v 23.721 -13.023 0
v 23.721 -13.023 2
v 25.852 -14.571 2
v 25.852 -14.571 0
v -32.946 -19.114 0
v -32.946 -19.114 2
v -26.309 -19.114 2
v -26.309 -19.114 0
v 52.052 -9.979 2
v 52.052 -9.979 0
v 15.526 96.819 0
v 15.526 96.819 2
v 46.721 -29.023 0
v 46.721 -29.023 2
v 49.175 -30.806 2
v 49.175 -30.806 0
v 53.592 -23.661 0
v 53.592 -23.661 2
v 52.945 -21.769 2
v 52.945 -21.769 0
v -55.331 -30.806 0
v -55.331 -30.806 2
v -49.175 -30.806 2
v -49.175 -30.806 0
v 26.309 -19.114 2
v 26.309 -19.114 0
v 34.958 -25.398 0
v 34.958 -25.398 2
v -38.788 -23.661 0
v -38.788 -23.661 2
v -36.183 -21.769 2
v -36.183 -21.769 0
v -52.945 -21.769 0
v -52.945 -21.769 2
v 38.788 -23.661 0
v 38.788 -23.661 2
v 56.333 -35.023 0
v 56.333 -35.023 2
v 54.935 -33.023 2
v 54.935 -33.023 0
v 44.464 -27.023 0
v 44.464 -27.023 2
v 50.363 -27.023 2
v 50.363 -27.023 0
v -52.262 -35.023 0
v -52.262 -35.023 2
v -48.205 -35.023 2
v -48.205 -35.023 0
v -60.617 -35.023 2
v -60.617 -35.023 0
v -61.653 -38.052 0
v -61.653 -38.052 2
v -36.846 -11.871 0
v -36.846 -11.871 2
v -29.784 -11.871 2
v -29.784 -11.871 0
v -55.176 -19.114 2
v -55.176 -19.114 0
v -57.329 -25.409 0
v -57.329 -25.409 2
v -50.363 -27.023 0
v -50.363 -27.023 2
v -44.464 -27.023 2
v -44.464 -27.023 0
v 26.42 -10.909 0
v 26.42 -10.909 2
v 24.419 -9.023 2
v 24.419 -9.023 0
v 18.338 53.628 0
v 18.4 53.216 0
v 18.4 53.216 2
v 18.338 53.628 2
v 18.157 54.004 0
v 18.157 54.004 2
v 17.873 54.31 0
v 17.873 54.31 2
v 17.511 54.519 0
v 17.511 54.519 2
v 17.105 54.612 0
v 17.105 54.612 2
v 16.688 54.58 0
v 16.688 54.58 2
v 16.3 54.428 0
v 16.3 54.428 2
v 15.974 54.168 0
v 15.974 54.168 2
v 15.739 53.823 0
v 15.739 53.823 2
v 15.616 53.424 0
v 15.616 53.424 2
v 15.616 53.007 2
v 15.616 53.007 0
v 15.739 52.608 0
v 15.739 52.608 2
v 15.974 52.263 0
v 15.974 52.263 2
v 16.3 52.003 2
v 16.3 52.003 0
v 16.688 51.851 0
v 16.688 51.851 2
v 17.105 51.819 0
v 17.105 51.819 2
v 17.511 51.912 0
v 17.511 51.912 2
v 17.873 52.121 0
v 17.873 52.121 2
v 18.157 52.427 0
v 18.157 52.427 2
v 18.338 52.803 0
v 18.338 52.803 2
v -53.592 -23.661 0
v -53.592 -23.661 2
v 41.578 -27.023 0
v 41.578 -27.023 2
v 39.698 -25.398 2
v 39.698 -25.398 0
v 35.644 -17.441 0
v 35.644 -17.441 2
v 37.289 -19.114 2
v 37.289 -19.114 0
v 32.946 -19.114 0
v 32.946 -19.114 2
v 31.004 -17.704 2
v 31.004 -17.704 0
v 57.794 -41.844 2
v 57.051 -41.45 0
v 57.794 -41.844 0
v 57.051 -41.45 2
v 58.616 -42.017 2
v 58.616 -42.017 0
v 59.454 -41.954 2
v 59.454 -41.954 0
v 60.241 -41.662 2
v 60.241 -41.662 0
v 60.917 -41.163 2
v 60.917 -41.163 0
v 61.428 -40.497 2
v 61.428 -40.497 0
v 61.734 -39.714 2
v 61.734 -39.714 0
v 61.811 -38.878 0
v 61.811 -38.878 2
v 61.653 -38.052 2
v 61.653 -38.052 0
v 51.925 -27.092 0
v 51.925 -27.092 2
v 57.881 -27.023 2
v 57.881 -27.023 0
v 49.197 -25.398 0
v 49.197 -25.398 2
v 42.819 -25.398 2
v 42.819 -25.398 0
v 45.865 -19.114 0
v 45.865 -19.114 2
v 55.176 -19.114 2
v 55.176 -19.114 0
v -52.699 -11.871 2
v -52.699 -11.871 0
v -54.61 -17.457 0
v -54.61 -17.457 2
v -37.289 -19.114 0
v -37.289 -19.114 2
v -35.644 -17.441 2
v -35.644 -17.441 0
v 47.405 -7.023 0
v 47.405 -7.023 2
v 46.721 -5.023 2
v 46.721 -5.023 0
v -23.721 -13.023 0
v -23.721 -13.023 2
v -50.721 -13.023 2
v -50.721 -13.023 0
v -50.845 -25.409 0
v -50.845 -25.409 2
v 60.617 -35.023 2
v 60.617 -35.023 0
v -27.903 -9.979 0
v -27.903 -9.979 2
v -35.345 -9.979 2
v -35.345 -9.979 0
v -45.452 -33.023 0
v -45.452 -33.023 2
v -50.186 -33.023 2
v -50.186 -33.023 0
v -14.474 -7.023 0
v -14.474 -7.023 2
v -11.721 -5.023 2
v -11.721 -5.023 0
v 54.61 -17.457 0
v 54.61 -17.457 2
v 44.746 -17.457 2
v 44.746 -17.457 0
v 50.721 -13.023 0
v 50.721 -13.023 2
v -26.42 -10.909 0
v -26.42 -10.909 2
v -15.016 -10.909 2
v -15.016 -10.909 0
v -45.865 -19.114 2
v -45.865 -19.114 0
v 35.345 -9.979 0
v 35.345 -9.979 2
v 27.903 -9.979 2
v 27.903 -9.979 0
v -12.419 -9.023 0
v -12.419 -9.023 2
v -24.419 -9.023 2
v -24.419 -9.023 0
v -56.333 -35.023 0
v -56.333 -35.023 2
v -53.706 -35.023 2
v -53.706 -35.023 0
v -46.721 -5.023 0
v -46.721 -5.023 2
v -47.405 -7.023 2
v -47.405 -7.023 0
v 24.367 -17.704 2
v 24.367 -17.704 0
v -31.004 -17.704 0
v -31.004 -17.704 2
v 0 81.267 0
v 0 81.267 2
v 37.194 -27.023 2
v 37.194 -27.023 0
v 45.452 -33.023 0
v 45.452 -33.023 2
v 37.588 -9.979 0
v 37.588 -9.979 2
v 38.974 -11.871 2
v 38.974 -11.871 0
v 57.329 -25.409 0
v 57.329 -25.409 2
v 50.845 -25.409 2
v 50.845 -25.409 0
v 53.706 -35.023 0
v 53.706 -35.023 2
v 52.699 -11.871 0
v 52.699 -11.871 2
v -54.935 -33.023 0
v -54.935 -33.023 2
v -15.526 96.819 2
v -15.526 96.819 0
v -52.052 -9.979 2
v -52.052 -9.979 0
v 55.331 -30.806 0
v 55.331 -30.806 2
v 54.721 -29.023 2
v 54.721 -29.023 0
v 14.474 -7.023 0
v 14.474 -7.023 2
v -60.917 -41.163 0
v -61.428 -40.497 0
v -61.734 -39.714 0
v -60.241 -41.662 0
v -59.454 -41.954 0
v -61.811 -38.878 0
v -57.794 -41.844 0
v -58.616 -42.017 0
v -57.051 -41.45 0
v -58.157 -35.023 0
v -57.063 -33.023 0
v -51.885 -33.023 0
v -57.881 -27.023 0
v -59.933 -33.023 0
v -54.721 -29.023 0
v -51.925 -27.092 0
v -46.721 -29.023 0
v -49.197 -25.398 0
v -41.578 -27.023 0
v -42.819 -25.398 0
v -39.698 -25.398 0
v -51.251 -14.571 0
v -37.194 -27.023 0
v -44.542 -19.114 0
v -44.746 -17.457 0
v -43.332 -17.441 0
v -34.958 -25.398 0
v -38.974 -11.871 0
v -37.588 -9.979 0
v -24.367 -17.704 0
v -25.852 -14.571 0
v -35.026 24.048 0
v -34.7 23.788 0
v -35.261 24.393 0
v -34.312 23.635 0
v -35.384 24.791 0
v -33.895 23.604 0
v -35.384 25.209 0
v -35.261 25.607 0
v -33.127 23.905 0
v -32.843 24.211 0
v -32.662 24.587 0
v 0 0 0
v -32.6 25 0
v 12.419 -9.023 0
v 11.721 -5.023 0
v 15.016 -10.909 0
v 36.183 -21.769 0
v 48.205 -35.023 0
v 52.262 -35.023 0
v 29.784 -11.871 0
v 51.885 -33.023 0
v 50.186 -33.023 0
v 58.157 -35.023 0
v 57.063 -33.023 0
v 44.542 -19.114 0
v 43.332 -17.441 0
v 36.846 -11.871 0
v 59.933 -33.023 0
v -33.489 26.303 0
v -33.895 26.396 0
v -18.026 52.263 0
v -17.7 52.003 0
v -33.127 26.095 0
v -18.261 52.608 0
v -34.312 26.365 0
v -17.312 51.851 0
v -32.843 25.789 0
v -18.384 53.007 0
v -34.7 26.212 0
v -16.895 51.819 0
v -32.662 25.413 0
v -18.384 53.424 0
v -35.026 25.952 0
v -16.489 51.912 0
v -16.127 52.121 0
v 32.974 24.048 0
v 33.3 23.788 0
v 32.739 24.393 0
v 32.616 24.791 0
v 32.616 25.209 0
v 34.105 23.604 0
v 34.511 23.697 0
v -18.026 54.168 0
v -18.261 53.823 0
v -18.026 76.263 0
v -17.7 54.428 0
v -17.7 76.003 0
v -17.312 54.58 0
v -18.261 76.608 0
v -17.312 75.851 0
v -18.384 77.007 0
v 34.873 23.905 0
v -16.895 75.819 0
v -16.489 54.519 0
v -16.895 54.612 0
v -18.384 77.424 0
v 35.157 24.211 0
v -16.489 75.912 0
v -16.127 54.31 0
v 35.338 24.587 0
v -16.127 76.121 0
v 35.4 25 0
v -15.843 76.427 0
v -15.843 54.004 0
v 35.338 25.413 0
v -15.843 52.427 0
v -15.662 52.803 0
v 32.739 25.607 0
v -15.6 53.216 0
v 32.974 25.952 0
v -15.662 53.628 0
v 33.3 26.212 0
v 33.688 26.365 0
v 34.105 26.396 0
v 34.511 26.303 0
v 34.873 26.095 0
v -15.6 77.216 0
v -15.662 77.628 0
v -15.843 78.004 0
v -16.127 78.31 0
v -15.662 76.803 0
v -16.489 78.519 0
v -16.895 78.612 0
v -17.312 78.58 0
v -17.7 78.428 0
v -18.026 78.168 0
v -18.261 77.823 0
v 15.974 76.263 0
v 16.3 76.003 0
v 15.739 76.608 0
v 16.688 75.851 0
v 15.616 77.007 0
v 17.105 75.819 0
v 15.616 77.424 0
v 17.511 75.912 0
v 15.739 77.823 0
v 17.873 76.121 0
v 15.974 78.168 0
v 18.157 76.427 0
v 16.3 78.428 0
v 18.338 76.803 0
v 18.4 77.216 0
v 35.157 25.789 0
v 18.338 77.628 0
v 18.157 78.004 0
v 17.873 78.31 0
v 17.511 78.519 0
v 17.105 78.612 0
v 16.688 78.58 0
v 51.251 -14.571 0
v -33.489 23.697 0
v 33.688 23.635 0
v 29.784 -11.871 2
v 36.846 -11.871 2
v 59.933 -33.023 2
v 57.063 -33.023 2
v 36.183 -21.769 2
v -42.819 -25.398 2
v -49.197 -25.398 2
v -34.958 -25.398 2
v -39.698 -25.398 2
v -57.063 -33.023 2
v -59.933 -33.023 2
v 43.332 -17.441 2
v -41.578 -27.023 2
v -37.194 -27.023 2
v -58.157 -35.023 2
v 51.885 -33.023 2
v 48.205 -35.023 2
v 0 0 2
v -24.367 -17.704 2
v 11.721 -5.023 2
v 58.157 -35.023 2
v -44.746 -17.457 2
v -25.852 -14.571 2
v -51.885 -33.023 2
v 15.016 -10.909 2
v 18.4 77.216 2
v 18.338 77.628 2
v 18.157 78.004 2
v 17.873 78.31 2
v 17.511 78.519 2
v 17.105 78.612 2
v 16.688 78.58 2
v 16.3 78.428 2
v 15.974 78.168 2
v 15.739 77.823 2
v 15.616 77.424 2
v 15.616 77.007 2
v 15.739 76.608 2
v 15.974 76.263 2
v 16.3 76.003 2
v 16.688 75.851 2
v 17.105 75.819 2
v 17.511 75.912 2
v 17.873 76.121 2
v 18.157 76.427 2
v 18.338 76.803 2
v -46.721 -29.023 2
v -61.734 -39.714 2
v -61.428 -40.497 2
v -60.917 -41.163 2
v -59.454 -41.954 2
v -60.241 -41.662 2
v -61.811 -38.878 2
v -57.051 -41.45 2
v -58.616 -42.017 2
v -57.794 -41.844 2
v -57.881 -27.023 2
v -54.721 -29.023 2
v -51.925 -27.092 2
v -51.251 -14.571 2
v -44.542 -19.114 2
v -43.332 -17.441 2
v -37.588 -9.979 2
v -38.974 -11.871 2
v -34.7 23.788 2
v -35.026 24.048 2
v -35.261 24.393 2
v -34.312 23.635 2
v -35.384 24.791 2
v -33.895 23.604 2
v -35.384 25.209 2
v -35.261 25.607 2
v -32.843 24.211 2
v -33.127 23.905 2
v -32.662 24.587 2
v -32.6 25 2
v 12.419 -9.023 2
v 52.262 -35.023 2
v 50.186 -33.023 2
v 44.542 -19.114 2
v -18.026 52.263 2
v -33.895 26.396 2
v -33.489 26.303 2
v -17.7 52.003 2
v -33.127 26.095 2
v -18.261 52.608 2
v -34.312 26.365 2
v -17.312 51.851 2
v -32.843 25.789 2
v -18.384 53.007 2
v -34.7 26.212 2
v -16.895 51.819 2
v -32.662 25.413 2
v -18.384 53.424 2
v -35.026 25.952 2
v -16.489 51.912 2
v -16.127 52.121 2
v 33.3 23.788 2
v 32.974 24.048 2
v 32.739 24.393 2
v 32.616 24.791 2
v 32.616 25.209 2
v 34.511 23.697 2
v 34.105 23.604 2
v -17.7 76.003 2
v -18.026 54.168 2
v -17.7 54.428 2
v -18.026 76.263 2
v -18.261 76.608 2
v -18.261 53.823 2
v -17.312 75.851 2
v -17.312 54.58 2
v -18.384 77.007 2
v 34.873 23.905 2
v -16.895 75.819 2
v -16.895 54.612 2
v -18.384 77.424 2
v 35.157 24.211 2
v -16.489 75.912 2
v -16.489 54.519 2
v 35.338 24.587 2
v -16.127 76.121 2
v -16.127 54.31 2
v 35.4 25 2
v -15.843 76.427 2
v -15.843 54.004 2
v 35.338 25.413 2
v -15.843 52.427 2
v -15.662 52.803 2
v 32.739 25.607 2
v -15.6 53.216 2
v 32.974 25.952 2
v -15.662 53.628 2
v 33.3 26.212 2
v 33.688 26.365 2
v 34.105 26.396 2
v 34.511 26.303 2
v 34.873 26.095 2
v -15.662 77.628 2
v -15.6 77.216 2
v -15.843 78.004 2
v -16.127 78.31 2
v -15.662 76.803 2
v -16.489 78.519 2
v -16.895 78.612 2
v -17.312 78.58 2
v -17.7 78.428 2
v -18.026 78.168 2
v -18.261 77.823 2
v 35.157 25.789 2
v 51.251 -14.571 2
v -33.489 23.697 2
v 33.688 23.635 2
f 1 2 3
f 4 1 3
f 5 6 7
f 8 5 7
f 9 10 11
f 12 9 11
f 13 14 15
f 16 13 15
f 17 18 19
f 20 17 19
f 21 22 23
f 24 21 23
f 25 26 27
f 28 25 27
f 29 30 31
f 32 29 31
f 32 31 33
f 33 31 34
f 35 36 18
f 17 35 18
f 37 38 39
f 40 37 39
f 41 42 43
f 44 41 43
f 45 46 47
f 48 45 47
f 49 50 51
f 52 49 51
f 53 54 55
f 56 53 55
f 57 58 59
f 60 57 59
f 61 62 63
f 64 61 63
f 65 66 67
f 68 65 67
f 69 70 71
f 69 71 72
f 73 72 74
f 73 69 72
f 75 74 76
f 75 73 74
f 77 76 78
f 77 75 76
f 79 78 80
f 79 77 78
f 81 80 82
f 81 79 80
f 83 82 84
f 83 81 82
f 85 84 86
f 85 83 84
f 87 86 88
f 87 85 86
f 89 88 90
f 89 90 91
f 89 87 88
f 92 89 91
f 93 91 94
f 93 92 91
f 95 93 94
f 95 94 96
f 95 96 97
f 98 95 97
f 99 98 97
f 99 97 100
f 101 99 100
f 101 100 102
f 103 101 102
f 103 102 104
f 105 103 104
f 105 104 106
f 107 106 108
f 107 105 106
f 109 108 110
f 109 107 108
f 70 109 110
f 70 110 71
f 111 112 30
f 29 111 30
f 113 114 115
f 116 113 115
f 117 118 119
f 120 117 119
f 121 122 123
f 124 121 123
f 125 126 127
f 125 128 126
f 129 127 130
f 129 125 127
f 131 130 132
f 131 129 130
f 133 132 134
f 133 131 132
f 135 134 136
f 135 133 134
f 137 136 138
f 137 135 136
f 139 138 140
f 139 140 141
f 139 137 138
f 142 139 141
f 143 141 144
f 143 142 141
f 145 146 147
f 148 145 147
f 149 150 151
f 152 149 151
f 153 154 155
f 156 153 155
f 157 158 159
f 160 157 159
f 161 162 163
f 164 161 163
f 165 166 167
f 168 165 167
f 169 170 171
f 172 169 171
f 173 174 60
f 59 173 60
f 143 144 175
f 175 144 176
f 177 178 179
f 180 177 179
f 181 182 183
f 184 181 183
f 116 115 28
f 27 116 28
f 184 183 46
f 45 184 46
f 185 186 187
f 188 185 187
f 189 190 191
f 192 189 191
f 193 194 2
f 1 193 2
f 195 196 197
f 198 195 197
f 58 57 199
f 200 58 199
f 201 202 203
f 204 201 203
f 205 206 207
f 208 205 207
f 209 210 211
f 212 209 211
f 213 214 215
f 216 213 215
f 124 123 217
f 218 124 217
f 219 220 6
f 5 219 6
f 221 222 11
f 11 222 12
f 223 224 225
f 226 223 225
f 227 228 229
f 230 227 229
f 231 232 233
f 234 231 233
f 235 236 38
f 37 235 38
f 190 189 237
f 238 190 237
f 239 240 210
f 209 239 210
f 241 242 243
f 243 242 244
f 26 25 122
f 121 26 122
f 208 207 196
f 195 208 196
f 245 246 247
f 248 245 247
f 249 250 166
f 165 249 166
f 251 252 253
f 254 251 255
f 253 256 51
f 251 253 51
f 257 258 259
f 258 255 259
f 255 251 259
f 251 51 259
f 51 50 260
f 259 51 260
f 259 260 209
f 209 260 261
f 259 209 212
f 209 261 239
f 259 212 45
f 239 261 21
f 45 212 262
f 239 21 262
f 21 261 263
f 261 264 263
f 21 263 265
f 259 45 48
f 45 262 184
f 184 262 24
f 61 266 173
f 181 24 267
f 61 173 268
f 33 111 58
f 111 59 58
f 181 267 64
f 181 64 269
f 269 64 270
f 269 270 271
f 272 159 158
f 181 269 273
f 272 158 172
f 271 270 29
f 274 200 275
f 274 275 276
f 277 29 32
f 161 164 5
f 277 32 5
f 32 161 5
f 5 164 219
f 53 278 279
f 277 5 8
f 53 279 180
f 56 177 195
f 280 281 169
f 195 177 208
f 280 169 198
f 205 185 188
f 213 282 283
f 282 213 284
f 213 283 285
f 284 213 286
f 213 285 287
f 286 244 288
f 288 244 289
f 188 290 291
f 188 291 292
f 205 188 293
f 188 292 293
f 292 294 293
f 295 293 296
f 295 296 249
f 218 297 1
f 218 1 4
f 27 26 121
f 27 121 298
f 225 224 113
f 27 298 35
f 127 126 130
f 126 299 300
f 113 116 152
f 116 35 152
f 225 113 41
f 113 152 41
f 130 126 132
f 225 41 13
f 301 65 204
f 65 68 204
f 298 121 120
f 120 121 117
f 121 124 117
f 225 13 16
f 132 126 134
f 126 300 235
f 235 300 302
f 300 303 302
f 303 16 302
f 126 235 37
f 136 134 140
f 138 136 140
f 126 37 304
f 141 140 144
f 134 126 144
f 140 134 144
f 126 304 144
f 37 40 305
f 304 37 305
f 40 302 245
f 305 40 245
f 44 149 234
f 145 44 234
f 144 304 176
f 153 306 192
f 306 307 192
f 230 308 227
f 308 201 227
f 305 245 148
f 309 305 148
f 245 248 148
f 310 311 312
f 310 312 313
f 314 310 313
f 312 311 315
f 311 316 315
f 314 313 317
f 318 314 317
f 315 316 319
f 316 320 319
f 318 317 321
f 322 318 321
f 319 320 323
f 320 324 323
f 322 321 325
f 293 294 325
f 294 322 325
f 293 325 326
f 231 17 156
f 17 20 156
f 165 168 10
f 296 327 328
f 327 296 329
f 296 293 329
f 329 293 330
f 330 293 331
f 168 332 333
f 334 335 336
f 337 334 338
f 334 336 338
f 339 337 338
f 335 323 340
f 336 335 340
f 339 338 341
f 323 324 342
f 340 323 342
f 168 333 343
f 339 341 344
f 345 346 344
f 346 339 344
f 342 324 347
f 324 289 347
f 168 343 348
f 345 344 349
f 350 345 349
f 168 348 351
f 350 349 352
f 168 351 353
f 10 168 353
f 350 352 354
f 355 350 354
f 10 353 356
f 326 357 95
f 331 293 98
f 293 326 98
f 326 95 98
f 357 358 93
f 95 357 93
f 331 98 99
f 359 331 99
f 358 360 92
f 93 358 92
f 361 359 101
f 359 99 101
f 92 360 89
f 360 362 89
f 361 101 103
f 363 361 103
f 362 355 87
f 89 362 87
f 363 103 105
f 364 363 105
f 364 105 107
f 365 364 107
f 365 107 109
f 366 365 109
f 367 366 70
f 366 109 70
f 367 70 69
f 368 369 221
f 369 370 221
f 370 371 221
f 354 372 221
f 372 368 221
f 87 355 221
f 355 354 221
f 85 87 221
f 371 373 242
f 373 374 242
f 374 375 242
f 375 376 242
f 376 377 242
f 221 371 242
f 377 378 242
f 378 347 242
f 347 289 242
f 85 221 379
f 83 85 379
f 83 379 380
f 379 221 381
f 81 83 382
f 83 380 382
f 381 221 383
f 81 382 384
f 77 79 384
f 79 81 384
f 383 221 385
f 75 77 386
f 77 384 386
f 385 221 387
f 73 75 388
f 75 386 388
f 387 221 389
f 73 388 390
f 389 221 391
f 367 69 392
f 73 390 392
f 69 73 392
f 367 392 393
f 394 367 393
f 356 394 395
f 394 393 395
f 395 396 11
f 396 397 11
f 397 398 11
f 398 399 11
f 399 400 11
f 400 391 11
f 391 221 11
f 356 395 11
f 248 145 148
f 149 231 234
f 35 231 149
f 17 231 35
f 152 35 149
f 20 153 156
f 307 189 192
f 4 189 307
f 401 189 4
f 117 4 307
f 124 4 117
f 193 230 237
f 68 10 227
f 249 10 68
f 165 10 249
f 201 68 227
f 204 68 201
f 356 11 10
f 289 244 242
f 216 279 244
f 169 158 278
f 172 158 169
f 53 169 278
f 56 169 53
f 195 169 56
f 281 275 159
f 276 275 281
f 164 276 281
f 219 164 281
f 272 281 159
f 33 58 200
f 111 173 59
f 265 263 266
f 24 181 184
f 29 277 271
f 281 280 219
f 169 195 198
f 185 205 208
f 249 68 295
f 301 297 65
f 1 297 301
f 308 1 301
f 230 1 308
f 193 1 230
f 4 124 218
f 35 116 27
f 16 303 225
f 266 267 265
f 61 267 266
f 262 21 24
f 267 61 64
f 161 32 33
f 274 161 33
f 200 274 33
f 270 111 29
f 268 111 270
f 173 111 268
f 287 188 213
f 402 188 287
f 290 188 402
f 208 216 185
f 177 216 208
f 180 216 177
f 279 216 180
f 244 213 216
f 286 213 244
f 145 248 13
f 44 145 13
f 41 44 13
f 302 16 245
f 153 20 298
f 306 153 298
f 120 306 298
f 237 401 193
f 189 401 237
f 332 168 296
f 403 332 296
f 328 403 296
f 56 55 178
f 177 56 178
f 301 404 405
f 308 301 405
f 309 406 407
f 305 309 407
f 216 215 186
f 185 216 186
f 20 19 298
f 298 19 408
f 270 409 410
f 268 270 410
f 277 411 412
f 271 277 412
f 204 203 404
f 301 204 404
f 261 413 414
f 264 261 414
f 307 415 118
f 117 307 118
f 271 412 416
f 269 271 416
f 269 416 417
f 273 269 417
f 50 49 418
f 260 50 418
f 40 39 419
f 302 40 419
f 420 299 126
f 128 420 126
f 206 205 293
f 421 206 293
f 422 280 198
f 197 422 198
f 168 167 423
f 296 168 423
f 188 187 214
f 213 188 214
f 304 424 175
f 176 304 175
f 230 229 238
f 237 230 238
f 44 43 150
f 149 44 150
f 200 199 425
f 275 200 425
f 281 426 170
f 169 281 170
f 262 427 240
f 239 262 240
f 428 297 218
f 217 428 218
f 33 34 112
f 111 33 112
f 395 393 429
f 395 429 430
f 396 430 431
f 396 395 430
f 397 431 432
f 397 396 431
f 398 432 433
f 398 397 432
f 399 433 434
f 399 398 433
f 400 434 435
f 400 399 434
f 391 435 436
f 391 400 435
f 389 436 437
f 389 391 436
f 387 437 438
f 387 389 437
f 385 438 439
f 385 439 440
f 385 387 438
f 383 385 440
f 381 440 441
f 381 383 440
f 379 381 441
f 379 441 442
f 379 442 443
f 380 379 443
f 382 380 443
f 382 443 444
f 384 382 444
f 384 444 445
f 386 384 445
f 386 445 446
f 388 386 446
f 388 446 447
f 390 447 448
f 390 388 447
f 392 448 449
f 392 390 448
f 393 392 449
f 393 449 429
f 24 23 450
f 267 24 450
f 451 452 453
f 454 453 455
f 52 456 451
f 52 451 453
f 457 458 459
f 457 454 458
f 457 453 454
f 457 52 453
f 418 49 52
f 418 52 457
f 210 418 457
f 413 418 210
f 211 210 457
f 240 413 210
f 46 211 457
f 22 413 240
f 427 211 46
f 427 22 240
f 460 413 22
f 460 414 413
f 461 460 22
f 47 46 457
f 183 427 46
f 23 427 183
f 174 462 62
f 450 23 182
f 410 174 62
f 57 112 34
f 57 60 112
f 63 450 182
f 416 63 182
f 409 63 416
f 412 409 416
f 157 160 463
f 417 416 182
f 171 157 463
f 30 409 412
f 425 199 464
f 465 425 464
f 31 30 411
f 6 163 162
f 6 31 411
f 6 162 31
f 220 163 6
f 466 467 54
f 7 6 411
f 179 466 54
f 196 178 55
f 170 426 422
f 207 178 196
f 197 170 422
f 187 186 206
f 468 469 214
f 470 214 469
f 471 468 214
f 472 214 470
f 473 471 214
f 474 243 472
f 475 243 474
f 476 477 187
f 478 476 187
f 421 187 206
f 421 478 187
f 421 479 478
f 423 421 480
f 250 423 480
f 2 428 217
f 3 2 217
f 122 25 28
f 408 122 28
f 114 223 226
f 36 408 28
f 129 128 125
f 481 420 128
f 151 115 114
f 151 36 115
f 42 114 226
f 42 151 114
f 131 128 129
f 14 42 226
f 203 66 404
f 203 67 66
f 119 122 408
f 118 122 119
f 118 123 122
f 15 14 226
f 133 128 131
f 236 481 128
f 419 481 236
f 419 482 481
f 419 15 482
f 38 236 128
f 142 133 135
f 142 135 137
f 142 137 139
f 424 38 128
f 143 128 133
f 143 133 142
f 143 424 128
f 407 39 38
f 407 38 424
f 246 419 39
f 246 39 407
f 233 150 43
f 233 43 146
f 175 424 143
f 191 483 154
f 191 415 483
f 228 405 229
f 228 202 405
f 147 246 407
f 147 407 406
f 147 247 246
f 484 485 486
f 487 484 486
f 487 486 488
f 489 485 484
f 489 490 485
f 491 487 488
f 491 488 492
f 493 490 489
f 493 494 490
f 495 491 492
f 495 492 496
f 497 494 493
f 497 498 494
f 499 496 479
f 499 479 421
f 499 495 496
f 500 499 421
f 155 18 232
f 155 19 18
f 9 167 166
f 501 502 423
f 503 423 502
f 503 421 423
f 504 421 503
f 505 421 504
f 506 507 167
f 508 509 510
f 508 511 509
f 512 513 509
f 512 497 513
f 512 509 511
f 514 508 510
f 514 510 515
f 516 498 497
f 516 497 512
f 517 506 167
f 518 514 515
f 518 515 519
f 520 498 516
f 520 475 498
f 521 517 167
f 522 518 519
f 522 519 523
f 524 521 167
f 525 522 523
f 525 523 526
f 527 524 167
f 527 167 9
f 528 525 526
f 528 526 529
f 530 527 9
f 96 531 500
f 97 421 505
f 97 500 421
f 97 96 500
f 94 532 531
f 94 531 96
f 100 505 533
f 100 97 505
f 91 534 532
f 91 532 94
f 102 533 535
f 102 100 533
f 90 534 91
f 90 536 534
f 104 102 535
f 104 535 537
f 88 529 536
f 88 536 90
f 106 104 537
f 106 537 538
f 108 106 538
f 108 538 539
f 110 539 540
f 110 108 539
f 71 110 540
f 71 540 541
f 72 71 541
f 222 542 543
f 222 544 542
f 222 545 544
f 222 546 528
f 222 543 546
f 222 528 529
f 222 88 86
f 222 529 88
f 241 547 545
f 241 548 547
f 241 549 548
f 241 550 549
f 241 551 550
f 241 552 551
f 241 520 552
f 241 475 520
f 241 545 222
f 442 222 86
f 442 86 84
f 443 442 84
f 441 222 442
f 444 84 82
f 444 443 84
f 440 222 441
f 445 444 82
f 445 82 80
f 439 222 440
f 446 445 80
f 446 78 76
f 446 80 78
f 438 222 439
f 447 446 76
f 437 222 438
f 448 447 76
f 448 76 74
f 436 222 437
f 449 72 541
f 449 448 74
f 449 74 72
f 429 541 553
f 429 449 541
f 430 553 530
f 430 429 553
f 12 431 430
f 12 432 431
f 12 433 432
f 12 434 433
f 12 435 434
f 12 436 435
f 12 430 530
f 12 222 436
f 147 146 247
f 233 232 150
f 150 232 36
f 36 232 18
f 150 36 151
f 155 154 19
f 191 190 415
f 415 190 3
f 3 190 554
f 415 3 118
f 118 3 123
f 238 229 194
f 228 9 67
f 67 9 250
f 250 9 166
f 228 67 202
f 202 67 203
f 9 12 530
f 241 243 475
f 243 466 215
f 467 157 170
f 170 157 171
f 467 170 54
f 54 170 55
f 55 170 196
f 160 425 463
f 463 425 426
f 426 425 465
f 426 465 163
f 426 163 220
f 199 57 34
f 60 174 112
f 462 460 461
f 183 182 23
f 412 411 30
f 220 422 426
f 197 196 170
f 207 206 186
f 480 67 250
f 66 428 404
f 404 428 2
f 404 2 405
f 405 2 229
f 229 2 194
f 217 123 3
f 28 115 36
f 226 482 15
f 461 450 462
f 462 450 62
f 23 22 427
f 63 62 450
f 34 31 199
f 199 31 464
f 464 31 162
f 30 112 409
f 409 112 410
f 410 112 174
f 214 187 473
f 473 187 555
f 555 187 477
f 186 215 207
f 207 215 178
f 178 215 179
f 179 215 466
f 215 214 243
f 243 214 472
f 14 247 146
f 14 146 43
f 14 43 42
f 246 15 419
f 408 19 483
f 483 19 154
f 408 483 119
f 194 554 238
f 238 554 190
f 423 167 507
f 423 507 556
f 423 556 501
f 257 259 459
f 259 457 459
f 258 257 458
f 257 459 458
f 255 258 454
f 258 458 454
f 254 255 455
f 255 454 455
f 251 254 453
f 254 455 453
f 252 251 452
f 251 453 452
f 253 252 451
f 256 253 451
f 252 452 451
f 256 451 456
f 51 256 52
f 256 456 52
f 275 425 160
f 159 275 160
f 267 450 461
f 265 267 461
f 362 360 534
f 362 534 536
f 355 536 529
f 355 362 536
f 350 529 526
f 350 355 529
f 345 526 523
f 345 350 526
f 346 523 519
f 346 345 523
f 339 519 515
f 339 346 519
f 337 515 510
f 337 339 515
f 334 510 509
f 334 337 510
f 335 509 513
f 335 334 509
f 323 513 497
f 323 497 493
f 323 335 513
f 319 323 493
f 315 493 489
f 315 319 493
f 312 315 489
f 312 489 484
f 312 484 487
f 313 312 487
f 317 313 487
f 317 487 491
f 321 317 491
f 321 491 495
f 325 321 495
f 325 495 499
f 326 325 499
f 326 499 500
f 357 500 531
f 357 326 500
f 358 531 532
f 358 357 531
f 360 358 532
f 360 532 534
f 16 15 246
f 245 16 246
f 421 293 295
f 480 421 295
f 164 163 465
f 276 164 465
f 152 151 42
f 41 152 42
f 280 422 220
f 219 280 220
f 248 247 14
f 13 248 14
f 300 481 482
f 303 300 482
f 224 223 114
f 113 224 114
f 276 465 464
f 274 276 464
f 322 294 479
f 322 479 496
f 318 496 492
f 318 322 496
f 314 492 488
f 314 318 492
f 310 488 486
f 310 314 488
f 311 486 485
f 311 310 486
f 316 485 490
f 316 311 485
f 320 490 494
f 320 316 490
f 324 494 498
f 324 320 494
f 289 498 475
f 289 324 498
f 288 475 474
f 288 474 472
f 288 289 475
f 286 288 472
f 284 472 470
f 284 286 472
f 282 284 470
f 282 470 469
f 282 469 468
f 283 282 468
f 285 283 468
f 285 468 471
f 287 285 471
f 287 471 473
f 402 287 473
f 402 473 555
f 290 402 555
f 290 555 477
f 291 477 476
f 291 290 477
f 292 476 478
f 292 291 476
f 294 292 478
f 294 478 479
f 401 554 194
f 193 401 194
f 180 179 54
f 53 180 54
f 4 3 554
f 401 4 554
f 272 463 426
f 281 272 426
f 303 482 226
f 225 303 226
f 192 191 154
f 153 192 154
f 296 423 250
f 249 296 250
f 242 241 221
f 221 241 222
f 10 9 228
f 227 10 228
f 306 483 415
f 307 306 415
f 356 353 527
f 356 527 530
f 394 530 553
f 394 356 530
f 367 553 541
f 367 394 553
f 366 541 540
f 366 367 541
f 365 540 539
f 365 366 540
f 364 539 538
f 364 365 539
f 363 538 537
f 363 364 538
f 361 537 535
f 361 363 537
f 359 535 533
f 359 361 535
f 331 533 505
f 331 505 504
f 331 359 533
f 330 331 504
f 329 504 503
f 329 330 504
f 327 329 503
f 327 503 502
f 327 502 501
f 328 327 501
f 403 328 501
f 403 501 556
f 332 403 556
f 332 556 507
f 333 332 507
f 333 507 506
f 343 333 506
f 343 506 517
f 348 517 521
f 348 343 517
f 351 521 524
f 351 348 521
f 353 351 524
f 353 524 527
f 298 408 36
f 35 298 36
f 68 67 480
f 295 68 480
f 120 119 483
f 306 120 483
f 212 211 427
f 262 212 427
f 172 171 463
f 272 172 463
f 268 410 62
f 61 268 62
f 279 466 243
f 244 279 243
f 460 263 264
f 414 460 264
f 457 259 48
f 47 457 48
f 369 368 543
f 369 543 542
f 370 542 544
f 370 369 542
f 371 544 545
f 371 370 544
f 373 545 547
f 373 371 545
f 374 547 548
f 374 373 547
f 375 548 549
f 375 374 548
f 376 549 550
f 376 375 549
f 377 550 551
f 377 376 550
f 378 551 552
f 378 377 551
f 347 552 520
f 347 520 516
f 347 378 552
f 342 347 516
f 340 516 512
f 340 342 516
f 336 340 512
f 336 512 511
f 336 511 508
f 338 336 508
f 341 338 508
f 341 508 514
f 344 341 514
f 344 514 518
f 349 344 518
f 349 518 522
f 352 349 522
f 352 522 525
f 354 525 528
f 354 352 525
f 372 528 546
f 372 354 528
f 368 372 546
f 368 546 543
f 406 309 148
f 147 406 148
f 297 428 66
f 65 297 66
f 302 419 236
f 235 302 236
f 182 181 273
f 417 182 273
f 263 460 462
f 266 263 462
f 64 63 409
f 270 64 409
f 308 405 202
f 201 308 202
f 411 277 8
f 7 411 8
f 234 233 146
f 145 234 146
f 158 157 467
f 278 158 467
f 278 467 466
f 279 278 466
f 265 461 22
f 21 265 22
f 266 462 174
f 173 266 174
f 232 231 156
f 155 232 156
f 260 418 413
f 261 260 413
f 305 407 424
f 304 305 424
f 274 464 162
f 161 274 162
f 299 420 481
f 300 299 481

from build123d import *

# Parameters (mm, degrees)
F0_R     = 1.4
F1_DEPTH = 2
F3_DEPTH = 2.001
F4_R     = 3
F5_R     = 3
F7_DEPTH = 2.001


with BuildPart() as f1:
    # F0 (on Top) → F1 (new body)
    with BuildSketch(Plane.XY):
        Polygon((64.72135955, -47.0228201834), (0, 142.2155100196), (-64.72135955, -47.0228201834), (0, 0), align=None)
        with Locations((-34, 25)):
            Circle(F0_R, mode=Mode.SUBTRACT)
        with Locations((34, 25)):
            Circle(F0_R, mode=Mode.SUBTRACT)
        with Locations((-17, 53.2155100196)):
            Circle(F0_R, mode=Mode.SUBTRACT)
        with Locations((-17, 77.2155100196)):
            Circle(F0_R, mode=Mode.SUBTRACT)
        with Locations((17, 53.2155100196)):
            Circle(F0_R, mode=Mode.SUBTRACT)
        with Locations((17, 77.2155100196)):
            Circle(F0_R, mode=Mode.SUBTRACT)
    extrude(amount=F1_DEPTH)

    # F2 (on face) → F3 (cut, through all)
    with BuildSketch(Plane.XY.offset(2)):
        Polygon((-11.72135955, -5.0228201834), (-46.72135955, -5.0228201834), (-47.4053791086, -7.0228201834), (-14.4741233909, -7.0228201834), align=None)
        Polygon((-12.4188465721, -9.0228201834), (-24.4188465721, -9.0228201834), (-26.4198078873, -10.9094650687), (-15.0155904826, -10.9094650687), align=None)
        Polygon((-23.72135955, -13.0228201834), (-50.72135955, -13.0228201834), (-51.2508899541, -14.5711104259), (-25.8523982474, -14.5711104259), align=None)
        Polygon((-54.6096456252, -17.4572506108), (-55.1764262564, -19.1144565314), (-45.8653729736, -19.1144565314), (-44.7456995673, -17.4572506108), align=None)
        Polygon((-36.183078901, -21.7685099146), (-52.9450522033, -21.7685099146), (-53.5922657988, -23.6608932166), (-38.7877210645, -23.6608932166), align=None)
        Polygon((-57.329058215, -25.4085220489), (-57.8811639638, -27.0228201834), (-51.9252746689, -27.0915274002), (-50.8447687747, -25.4085220489), align=None)
        Polygon((-42.8185183528, -25.398144593), (-49.1967415728, -25.398144593), (-50.3631159663, -27.0228201834), (-44.4640927017, -27.0228201834), align=None)
        Polygon((-34.9575470313, -25.398144593), (-39.6975811287, -25.398144593), (-41.5776334703, -27.0228201834), (-37.1937211406, -27.0228201834), align=None)
        Polygon((-46.72135955, -29.0228201834), (-54.72135955, -29.0228201834), (-55.3310927131, -30.8056147116), (-49.1751657065, -30.8056147116), align=None)
        Polygon((-59.9332226396, -33.0228201834), (-60.6172421983, -35.0228201834), (-58.1569412289, -35.0228201834), (-57.0628715088, -33.0228201834), align=None)
        Polygon((-52.0519517882, -9.9788275021), (-52.6991653837, -11.8712108041), (-38.9741415612, -11.8712108041), (-37.5880427095, -9.9788275021), align=None)
        Polygon((-32.9459308027, -19.1144565314), (-26.3087923894, -19.1144565314), (-24.3671516029, -17.7037719259), (-31.0042900162, -17.7037719259), align=None)
        Polygon((-35.6436006209, -17.440581688), (-43.3317036365, -17.440581688), (-44.5420111982, -19.1144565314), (-37.288930104, -19.1144565314), align=None)
        Polygon((-51.8852360547, -33.0228201834), (-54.9353141808, -33.0228201834), (-56.3333206621, -35.0228201834), (-53.706107908, -35.0228201834), align=None)
        Polygon((-45.4520126634, -33.0228201834), (-50.1858113088, -33.0228201834), (-52.2623182004, -35.0228201834), (-48.2047765043, -35.0228201834), align=None)
        Polygon((-27.9032053004, -9.9788275021), (-35.3451147676, -9.9788275021), (-36.8457930443, -11.8712108041), (-29.7840517014, -11.8712108041), align=None)
        Polygon((24.3671516029, -17.7037719259), (26.3087923894, -19.1144565314), (32.9459308027, -19.1144565314), (31.0042900162, -17.7037719259), align=None)
        Polygon((46.72135955, -29.0228201834), (49.1751657065, -30.8056147116), (55.3310927131, -30.8056147116), (54.72135955, -29.0228201834), align=None)
        Polygon((54.6096456252, -17.4572506108), (44.7456995673, -17.4572506108), (45.8653729736, -19.1144565314), (55.1764262564, -19.1144565314), align=None)
        Polygon((53.5922657988, -23.6608932166), (52.9450522033, -21.7685099146), (36.183078901, -21.7685099146), (38.7877210645, -23.6608932166), align=None)
        Polygon((51.9252746689, -27.0915274002), (57.8811639638, -27.0228201834), (57.329058215, -25.4085220489), (50.8447687747, -25.4085220489), align=None)
        Polygon((51.8852360547, -33.0228201834), (53.706107908, -35.0228201834), (56.3333206621, -35.0228201834), (54.9353141808, -33.0228201834), align=None)
        Polygon((34.9575470313, -25.398144593), (37.1937211406, -27.0228201834), (41.5776334703, -27.0228201834), (39.6975811287, -25.398144593), align=None)
        Polygon((50.1858113088, -33.0228201834), (45.4520126634, -33.0228201834), (48.2047765043, -35.0228201834), (52.2623182004, -35.0228201834), align=None)
        Polygon((26.4198078873, -10.9094650687), (24.4188465721, -9.0228201834), (12.4188465721, -9.0228201834), (15.0155904826, -10.9094650687), align=None)
        Polygon((44.4640927017, -27.0228201834), (50.3631159663, -27.0228201834), (49.1967415728, -25.398144593), (42.8185183528, -25.398144593), align=None)
        Polygon((36.8457930443, -11.8712108041), (35.3451147676, -9.9788275021), (27.9032053004, -9.9788275021), (29.7840517014, -11.8712108041), align=None)
        Polygon((52.0519517882, -9.9788275021), (37.5880427095, -9.9788275021), (38.9741415612, -11.8712108041), (52.6991653837, -11.8712108041), align=None)
        Polygon((43.3317036365, -17.440581688), (35.6436006209, -17.440581688), (37.288930104, -19.1144565314), (44.5420111982, -19.1144565314), align=None)
        Polygon((47.4053791086, -7.0228201834), (46.72135955, -5.0228201834), (11.72135955, -5.0228201834), (14.4741233909, -7.0228201834), align=None)
        Polygon((51.2508899541, -14.5711104259), (50.72135955, -13.0228201834), (23.72135955, -13.0228201834), (25.8523982474, -14.5711104259), align=None)
        Polygon((60.6172421983, -35.0228201834), (59.9332226396, -33.0228201834), (57.0628715088, -33.0228201834), (58.1569412289, -35.0228201834), align=None)
    extrude(amount=-F3_DEPTH, mode=Mode.SUBTRACT)

    # F4
    f4_edges = [f1.edges().sort_by_distance(p)[0] for p in [
        (-64.72136, -47.02282, 1),
    ]]
    fillet(f4_edges, radius=F4_R)

    # F5
    f5_edges = [f1.edges().sort_by_distance(p)[0] for p in [
        (64.72136, -47.02282, 1),
    ]]
    fillet(f5_edges, radius=F5_R)

    # F6 (on face) → F7 (cut, through all)
    with BuildSketch(Plane.XY.offset(2)):
        Polygon((-15.5259804046, 96.8192045811), (0, 81.2669247389), (15.5259804046, 96.8192045811), (0, 142.2155100196), align=None)
    extrude(amount=-F7_DEPTH, mode=Mode.SUBTRACT)


solid = f1.part
